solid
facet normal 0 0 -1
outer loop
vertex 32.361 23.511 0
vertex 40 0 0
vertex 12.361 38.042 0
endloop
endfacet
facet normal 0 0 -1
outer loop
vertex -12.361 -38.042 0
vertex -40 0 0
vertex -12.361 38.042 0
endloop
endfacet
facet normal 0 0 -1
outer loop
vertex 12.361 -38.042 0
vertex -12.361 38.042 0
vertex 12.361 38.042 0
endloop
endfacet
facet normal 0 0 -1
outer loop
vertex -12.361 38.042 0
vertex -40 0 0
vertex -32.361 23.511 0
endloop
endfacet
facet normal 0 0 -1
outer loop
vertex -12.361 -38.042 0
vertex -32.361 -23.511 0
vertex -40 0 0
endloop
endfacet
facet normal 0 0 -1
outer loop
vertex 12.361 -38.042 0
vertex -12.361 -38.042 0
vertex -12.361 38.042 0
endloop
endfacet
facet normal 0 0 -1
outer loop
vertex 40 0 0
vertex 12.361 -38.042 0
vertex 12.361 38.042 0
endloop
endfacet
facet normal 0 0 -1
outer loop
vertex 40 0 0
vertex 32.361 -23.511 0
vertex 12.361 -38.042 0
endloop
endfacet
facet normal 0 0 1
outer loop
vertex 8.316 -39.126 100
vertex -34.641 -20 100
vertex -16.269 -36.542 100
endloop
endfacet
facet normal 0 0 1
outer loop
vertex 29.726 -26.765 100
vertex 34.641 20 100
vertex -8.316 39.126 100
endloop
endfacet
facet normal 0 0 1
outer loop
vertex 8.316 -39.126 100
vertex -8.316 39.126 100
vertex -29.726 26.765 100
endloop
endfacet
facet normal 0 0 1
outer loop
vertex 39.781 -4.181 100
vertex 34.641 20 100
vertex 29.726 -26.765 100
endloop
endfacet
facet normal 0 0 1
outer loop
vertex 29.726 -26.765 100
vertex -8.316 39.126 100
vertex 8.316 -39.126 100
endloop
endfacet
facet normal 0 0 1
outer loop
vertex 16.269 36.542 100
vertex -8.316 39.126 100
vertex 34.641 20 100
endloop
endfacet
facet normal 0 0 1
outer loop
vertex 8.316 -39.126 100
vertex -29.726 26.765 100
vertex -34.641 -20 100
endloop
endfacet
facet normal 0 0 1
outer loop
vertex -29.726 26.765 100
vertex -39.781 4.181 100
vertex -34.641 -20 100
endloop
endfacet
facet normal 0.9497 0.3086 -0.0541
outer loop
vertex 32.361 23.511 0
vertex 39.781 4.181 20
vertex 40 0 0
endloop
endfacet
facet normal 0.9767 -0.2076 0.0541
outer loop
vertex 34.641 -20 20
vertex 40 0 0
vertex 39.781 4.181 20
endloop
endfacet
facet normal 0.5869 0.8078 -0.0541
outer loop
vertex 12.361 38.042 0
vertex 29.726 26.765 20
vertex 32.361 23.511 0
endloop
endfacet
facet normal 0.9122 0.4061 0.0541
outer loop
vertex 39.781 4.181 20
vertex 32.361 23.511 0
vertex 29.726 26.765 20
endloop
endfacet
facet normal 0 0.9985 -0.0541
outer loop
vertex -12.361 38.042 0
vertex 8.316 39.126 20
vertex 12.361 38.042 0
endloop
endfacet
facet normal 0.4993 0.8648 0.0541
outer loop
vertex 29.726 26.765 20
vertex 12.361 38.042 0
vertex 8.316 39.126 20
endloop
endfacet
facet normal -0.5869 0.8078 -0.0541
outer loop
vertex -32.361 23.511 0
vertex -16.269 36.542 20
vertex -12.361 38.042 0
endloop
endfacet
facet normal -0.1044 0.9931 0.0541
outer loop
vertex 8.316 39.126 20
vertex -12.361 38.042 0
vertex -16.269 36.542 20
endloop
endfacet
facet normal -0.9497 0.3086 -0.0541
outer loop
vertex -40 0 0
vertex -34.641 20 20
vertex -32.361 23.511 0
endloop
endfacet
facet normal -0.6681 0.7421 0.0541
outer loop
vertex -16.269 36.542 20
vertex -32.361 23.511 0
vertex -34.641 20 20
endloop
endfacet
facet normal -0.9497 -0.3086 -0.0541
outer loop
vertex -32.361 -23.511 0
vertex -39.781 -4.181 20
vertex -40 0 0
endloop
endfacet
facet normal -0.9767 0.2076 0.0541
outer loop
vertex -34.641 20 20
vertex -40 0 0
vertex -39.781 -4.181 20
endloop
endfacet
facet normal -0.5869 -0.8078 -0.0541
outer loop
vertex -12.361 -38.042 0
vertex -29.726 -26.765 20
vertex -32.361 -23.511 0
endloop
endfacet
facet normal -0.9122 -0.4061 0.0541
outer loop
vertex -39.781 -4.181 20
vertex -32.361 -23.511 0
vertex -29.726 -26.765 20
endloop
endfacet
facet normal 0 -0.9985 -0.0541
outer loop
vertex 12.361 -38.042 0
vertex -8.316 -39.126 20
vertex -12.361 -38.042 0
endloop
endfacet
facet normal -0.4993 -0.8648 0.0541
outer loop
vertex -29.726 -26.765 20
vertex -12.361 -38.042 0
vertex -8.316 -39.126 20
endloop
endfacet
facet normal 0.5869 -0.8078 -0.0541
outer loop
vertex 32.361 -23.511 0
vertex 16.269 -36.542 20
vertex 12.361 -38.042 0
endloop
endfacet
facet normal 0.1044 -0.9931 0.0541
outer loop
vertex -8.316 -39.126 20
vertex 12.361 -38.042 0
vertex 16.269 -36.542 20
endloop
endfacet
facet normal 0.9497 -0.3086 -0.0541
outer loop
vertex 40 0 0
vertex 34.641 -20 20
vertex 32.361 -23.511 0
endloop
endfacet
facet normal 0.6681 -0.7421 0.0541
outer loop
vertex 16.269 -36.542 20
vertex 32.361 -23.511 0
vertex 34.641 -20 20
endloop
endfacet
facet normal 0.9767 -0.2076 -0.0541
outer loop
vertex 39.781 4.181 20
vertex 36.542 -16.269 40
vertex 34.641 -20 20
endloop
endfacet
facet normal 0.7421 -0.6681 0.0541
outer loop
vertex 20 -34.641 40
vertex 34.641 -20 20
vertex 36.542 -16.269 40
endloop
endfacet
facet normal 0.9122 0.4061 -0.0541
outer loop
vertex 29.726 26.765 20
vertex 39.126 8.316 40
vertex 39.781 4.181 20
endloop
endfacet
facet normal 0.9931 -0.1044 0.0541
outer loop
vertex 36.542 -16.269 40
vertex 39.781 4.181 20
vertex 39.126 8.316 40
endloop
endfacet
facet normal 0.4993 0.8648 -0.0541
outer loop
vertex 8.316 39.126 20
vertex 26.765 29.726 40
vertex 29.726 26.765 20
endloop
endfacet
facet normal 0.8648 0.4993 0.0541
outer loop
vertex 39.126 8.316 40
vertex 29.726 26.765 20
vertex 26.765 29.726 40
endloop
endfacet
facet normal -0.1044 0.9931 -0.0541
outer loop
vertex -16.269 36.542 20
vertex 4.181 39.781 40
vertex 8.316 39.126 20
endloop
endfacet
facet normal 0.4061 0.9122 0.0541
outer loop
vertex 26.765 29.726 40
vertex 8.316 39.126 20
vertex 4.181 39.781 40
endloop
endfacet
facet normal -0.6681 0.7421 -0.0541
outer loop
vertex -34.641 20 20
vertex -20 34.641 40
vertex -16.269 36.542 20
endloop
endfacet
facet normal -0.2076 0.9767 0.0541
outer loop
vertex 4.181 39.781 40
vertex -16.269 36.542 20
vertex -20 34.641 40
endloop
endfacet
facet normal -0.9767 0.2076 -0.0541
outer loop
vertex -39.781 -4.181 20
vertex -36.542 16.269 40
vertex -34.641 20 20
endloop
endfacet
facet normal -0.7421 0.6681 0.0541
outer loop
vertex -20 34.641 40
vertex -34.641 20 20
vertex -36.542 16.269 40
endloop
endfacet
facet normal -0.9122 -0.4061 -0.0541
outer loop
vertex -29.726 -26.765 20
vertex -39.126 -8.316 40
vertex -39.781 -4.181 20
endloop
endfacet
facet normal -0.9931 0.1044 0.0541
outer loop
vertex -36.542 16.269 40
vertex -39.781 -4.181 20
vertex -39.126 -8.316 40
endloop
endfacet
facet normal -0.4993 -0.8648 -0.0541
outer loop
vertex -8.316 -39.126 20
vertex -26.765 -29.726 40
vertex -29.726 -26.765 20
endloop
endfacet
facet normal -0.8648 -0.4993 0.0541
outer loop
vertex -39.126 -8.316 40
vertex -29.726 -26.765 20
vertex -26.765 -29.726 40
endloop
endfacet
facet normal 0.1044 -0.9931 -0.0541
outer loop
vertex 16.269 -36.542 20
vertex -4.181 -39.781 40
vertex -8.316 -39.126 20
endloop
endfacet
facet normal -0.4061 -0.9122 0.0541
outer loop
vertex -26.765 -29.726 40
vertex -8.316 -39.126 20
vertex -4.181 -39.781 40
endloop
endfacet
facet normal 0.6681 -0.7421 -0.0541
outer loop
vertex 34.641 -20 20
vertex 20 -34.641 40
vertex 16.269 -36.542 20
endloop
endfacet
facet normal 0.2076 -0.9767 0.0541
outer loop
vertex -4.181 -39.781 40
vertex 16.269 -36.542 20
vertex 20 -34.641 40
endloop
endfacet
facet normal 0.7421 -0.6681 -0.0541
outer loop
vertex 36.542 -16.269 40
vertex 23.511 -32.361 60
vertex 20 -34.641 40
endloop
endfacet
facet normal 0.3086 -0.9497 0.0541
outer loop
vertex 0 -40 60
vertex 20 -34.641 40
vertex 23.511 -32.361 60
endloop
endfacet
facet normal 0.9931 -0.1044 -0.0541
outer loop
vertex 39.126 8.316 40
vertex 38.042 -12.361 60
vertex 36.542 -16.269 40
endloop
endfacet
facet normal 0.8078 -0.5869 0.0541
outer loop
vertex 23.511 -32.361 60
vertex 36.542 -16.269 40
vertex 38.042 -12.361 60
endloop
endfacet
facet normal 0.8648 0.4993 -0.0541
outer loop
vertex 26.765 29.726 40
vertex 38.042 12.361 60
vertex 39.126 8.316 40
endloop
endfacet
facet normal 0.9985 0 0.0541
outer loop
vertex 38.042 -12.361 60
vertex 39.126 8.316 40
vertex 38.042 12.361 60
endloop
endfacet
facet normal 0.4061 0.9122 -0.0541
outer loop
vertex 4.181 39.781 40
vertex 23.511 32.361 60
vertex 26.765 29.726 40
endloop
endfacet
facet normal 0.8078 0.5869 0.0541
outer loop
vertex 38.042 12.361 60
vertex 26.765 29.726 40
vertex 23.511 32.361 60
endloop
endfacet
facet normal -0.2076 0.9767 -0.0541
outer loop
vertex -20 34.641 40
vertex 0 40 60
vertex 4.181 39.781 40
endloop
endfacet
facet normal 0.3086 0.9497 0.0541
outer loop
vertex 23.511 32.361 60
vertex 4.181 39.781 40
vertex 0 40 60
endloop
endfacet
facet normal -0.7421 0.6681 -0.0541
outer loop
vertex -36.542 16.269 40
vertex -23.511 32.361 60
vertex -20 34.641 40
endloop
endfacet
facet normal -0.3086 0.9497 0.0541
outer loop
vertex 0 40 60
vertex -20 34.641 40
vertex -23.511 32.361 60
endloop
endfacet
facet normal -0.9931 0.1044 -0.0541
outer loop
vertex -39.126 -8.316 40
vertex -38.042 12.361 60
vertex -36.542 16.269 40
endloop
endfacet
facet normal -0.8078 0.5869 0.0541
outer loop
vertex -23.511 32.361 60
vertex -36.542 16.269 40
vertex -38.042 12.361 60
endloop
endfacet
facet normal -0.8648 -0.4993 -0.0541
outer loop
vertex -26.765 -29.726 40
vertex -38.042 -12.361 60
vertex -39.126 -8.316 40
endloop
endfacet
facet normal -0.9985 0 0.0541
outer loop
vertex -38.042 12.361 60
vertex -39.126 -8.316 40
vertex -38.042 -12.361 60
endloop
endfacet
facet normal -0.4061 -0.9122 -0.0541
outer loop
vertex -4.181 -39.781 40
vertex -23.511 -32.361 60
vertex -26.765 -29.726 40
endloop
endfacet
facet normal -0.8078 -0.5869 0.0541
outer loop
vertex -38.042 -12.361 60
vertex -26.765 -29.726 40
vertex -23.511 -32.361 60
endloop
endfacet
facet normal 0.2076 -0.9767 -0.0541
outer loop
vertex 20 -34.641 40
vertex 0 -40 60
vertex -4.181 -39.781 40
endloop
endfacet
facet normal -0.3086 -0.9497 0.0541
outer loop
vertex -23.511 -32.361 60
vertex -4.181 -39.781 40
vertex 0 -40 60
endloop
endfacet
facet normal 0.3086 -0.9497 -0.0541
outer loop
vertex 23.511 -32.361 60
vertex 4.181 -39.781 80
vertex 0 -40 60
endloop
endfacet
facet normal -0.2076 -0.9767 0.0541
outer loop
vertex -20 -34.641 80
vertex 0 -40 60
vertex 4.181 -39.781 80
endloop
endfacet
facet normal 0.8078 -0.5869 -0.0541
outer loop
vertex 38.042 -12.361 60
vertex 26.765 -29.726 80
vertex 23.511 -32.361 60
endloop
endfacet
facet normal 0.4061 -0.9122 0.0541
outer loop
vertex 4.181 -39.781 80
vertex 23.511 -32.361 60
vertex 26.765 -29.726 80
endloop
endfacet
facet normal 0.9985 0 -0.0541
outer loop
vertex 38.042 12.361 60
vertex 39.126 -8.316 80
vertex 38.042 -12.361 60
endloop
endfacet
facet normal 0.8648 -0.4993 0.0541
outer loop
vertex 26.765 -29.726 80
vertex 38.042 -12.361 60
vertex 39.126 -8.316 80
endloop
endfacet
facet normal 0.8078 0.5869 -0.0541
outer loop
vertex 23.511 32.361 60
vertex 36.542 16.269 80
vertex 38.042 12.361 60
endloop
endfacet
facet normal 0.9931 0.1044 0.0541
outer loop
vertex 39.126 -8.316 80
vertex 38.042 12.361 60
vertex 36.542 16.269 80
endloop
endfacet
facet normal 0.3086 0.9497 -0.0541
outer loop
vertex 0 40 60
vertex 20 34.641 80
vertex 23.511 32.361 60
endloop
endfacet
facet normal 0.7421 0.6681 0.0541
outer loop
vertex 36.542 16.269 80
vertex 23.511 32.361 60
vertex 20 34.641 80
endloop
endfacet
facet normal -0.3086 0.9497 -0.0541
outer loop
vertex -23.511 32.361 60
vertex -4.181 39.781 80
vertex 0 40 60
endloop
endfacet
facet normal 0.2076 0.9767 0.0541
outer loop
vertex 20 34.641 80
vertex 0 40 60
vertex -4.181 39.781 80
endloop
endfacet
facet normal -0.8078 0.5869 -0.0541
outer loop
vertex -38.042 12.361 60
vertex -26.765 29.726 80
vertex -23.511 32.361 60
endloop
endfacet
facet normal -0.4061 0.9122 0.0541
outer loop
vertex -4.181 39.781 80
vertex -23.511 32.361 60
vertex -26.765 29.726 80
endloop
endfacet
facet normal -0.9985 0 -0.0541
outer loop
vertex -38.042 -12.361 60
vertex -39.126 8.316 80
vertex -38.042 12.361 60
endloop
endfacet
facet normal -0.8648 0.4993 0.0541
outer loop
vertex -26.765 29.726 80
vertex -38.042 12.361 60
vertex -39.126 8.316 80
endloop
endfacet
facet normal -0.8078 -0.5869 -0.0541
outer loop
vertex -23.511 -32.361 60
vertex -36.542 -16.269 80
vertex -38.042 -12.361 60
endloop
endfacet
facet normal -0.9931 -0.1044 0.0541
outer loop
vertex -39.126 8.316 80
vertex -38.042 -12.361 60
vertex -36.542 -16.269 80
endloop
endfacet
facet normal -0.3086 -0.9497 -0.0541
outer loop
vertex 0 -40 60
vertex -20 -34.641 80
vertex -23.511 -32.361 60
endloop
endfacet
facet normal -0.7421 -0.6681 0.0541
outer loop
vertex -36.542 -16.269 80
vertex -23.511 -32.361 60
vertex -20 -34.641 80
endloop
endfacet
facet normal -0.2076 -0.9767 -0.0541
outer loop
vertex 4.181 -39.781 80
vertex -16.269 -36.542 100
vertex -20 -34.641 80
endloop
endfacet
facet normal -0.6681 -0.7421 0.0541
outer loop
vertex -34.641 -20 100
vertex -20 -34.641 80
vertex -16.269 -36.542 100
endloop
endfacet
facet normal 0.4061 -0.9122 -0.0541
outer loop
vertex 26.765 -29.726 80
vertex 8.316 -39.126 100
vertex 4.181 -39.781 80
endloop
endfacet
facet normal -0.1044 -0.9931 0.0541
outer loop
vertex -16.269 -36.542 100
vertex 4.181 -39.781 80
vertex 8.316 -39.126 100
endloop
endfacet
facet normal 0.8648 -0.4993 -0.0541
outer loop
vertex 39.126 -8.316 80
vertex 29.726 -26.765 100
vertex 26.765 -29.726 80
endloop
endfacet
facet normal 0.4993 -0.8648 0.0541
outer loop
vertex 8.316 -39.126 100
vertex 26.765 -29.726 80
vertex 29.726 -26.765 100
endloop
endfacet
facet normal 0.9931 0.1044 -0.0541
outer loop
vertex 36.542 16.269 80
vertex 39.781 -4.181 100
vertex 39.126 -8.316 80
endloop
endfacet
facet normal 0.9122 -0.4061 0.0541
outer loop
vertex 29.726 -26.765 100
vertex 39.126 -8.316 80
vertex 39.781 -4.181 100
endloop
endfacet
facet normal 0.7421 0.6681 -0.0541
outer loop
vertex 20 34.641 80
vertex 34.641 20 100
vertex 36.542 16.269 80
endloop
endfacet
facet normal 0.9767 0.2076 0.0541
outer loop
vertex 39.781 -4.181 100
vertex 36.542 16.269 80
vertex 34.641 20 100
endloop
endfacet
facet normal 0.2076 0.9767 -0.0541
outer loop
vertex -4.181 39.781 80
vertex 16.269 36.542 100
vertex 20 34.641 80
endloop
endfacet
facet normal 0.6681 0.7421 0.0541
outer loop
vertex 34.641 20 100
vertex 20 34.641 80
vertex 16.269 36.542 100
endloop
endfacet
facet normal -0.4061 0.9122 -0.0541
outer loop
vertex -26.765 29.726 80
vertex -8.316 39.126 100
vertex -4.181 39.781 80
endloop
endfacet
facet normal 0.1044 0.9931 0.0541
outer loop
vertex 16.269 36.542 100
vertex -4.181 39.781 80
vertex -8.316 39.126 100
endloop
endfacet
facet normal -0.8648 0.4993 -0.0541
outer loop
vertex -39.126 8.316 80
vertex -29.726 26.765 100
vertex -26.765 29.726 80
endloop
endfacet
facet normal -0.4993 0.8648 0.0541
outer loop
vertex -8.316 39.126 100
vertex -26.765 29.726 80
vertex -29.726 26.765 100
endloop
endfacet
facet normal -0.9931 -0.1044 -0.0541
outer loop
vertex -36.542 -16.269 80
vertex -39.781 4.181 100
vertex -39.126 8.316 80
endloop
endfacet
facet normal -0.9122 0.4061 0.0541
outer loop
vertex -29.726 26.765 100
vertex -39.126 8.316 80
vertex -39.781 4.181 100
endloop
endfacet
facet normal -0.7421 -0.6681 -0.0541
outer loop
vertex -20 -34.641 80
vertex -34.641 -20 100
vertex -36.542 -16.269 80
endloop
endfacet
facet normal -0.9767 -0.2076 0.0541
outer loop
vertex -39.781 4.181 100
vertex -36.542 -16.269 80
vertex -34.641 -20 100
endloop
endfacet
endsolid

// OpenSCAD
scale_X_direction = 1;
scale_Y_direction = 1;
// height of the Vase in mm
height = 100;
// Defines the angle of the twist
twist = 150;
// The more sides, the rounder your Vase is.
Base_sides_number = 10;
// Radiusof the vase
radius = 40;

linear_extrude( height=height, twist=twist, scale=[scale_X_direction, scale_Y_direction], center=false){
  {
    $fn=Base_sides_number;    //set sides to Base_sides_number
    circle(r=radius);
  }
}
